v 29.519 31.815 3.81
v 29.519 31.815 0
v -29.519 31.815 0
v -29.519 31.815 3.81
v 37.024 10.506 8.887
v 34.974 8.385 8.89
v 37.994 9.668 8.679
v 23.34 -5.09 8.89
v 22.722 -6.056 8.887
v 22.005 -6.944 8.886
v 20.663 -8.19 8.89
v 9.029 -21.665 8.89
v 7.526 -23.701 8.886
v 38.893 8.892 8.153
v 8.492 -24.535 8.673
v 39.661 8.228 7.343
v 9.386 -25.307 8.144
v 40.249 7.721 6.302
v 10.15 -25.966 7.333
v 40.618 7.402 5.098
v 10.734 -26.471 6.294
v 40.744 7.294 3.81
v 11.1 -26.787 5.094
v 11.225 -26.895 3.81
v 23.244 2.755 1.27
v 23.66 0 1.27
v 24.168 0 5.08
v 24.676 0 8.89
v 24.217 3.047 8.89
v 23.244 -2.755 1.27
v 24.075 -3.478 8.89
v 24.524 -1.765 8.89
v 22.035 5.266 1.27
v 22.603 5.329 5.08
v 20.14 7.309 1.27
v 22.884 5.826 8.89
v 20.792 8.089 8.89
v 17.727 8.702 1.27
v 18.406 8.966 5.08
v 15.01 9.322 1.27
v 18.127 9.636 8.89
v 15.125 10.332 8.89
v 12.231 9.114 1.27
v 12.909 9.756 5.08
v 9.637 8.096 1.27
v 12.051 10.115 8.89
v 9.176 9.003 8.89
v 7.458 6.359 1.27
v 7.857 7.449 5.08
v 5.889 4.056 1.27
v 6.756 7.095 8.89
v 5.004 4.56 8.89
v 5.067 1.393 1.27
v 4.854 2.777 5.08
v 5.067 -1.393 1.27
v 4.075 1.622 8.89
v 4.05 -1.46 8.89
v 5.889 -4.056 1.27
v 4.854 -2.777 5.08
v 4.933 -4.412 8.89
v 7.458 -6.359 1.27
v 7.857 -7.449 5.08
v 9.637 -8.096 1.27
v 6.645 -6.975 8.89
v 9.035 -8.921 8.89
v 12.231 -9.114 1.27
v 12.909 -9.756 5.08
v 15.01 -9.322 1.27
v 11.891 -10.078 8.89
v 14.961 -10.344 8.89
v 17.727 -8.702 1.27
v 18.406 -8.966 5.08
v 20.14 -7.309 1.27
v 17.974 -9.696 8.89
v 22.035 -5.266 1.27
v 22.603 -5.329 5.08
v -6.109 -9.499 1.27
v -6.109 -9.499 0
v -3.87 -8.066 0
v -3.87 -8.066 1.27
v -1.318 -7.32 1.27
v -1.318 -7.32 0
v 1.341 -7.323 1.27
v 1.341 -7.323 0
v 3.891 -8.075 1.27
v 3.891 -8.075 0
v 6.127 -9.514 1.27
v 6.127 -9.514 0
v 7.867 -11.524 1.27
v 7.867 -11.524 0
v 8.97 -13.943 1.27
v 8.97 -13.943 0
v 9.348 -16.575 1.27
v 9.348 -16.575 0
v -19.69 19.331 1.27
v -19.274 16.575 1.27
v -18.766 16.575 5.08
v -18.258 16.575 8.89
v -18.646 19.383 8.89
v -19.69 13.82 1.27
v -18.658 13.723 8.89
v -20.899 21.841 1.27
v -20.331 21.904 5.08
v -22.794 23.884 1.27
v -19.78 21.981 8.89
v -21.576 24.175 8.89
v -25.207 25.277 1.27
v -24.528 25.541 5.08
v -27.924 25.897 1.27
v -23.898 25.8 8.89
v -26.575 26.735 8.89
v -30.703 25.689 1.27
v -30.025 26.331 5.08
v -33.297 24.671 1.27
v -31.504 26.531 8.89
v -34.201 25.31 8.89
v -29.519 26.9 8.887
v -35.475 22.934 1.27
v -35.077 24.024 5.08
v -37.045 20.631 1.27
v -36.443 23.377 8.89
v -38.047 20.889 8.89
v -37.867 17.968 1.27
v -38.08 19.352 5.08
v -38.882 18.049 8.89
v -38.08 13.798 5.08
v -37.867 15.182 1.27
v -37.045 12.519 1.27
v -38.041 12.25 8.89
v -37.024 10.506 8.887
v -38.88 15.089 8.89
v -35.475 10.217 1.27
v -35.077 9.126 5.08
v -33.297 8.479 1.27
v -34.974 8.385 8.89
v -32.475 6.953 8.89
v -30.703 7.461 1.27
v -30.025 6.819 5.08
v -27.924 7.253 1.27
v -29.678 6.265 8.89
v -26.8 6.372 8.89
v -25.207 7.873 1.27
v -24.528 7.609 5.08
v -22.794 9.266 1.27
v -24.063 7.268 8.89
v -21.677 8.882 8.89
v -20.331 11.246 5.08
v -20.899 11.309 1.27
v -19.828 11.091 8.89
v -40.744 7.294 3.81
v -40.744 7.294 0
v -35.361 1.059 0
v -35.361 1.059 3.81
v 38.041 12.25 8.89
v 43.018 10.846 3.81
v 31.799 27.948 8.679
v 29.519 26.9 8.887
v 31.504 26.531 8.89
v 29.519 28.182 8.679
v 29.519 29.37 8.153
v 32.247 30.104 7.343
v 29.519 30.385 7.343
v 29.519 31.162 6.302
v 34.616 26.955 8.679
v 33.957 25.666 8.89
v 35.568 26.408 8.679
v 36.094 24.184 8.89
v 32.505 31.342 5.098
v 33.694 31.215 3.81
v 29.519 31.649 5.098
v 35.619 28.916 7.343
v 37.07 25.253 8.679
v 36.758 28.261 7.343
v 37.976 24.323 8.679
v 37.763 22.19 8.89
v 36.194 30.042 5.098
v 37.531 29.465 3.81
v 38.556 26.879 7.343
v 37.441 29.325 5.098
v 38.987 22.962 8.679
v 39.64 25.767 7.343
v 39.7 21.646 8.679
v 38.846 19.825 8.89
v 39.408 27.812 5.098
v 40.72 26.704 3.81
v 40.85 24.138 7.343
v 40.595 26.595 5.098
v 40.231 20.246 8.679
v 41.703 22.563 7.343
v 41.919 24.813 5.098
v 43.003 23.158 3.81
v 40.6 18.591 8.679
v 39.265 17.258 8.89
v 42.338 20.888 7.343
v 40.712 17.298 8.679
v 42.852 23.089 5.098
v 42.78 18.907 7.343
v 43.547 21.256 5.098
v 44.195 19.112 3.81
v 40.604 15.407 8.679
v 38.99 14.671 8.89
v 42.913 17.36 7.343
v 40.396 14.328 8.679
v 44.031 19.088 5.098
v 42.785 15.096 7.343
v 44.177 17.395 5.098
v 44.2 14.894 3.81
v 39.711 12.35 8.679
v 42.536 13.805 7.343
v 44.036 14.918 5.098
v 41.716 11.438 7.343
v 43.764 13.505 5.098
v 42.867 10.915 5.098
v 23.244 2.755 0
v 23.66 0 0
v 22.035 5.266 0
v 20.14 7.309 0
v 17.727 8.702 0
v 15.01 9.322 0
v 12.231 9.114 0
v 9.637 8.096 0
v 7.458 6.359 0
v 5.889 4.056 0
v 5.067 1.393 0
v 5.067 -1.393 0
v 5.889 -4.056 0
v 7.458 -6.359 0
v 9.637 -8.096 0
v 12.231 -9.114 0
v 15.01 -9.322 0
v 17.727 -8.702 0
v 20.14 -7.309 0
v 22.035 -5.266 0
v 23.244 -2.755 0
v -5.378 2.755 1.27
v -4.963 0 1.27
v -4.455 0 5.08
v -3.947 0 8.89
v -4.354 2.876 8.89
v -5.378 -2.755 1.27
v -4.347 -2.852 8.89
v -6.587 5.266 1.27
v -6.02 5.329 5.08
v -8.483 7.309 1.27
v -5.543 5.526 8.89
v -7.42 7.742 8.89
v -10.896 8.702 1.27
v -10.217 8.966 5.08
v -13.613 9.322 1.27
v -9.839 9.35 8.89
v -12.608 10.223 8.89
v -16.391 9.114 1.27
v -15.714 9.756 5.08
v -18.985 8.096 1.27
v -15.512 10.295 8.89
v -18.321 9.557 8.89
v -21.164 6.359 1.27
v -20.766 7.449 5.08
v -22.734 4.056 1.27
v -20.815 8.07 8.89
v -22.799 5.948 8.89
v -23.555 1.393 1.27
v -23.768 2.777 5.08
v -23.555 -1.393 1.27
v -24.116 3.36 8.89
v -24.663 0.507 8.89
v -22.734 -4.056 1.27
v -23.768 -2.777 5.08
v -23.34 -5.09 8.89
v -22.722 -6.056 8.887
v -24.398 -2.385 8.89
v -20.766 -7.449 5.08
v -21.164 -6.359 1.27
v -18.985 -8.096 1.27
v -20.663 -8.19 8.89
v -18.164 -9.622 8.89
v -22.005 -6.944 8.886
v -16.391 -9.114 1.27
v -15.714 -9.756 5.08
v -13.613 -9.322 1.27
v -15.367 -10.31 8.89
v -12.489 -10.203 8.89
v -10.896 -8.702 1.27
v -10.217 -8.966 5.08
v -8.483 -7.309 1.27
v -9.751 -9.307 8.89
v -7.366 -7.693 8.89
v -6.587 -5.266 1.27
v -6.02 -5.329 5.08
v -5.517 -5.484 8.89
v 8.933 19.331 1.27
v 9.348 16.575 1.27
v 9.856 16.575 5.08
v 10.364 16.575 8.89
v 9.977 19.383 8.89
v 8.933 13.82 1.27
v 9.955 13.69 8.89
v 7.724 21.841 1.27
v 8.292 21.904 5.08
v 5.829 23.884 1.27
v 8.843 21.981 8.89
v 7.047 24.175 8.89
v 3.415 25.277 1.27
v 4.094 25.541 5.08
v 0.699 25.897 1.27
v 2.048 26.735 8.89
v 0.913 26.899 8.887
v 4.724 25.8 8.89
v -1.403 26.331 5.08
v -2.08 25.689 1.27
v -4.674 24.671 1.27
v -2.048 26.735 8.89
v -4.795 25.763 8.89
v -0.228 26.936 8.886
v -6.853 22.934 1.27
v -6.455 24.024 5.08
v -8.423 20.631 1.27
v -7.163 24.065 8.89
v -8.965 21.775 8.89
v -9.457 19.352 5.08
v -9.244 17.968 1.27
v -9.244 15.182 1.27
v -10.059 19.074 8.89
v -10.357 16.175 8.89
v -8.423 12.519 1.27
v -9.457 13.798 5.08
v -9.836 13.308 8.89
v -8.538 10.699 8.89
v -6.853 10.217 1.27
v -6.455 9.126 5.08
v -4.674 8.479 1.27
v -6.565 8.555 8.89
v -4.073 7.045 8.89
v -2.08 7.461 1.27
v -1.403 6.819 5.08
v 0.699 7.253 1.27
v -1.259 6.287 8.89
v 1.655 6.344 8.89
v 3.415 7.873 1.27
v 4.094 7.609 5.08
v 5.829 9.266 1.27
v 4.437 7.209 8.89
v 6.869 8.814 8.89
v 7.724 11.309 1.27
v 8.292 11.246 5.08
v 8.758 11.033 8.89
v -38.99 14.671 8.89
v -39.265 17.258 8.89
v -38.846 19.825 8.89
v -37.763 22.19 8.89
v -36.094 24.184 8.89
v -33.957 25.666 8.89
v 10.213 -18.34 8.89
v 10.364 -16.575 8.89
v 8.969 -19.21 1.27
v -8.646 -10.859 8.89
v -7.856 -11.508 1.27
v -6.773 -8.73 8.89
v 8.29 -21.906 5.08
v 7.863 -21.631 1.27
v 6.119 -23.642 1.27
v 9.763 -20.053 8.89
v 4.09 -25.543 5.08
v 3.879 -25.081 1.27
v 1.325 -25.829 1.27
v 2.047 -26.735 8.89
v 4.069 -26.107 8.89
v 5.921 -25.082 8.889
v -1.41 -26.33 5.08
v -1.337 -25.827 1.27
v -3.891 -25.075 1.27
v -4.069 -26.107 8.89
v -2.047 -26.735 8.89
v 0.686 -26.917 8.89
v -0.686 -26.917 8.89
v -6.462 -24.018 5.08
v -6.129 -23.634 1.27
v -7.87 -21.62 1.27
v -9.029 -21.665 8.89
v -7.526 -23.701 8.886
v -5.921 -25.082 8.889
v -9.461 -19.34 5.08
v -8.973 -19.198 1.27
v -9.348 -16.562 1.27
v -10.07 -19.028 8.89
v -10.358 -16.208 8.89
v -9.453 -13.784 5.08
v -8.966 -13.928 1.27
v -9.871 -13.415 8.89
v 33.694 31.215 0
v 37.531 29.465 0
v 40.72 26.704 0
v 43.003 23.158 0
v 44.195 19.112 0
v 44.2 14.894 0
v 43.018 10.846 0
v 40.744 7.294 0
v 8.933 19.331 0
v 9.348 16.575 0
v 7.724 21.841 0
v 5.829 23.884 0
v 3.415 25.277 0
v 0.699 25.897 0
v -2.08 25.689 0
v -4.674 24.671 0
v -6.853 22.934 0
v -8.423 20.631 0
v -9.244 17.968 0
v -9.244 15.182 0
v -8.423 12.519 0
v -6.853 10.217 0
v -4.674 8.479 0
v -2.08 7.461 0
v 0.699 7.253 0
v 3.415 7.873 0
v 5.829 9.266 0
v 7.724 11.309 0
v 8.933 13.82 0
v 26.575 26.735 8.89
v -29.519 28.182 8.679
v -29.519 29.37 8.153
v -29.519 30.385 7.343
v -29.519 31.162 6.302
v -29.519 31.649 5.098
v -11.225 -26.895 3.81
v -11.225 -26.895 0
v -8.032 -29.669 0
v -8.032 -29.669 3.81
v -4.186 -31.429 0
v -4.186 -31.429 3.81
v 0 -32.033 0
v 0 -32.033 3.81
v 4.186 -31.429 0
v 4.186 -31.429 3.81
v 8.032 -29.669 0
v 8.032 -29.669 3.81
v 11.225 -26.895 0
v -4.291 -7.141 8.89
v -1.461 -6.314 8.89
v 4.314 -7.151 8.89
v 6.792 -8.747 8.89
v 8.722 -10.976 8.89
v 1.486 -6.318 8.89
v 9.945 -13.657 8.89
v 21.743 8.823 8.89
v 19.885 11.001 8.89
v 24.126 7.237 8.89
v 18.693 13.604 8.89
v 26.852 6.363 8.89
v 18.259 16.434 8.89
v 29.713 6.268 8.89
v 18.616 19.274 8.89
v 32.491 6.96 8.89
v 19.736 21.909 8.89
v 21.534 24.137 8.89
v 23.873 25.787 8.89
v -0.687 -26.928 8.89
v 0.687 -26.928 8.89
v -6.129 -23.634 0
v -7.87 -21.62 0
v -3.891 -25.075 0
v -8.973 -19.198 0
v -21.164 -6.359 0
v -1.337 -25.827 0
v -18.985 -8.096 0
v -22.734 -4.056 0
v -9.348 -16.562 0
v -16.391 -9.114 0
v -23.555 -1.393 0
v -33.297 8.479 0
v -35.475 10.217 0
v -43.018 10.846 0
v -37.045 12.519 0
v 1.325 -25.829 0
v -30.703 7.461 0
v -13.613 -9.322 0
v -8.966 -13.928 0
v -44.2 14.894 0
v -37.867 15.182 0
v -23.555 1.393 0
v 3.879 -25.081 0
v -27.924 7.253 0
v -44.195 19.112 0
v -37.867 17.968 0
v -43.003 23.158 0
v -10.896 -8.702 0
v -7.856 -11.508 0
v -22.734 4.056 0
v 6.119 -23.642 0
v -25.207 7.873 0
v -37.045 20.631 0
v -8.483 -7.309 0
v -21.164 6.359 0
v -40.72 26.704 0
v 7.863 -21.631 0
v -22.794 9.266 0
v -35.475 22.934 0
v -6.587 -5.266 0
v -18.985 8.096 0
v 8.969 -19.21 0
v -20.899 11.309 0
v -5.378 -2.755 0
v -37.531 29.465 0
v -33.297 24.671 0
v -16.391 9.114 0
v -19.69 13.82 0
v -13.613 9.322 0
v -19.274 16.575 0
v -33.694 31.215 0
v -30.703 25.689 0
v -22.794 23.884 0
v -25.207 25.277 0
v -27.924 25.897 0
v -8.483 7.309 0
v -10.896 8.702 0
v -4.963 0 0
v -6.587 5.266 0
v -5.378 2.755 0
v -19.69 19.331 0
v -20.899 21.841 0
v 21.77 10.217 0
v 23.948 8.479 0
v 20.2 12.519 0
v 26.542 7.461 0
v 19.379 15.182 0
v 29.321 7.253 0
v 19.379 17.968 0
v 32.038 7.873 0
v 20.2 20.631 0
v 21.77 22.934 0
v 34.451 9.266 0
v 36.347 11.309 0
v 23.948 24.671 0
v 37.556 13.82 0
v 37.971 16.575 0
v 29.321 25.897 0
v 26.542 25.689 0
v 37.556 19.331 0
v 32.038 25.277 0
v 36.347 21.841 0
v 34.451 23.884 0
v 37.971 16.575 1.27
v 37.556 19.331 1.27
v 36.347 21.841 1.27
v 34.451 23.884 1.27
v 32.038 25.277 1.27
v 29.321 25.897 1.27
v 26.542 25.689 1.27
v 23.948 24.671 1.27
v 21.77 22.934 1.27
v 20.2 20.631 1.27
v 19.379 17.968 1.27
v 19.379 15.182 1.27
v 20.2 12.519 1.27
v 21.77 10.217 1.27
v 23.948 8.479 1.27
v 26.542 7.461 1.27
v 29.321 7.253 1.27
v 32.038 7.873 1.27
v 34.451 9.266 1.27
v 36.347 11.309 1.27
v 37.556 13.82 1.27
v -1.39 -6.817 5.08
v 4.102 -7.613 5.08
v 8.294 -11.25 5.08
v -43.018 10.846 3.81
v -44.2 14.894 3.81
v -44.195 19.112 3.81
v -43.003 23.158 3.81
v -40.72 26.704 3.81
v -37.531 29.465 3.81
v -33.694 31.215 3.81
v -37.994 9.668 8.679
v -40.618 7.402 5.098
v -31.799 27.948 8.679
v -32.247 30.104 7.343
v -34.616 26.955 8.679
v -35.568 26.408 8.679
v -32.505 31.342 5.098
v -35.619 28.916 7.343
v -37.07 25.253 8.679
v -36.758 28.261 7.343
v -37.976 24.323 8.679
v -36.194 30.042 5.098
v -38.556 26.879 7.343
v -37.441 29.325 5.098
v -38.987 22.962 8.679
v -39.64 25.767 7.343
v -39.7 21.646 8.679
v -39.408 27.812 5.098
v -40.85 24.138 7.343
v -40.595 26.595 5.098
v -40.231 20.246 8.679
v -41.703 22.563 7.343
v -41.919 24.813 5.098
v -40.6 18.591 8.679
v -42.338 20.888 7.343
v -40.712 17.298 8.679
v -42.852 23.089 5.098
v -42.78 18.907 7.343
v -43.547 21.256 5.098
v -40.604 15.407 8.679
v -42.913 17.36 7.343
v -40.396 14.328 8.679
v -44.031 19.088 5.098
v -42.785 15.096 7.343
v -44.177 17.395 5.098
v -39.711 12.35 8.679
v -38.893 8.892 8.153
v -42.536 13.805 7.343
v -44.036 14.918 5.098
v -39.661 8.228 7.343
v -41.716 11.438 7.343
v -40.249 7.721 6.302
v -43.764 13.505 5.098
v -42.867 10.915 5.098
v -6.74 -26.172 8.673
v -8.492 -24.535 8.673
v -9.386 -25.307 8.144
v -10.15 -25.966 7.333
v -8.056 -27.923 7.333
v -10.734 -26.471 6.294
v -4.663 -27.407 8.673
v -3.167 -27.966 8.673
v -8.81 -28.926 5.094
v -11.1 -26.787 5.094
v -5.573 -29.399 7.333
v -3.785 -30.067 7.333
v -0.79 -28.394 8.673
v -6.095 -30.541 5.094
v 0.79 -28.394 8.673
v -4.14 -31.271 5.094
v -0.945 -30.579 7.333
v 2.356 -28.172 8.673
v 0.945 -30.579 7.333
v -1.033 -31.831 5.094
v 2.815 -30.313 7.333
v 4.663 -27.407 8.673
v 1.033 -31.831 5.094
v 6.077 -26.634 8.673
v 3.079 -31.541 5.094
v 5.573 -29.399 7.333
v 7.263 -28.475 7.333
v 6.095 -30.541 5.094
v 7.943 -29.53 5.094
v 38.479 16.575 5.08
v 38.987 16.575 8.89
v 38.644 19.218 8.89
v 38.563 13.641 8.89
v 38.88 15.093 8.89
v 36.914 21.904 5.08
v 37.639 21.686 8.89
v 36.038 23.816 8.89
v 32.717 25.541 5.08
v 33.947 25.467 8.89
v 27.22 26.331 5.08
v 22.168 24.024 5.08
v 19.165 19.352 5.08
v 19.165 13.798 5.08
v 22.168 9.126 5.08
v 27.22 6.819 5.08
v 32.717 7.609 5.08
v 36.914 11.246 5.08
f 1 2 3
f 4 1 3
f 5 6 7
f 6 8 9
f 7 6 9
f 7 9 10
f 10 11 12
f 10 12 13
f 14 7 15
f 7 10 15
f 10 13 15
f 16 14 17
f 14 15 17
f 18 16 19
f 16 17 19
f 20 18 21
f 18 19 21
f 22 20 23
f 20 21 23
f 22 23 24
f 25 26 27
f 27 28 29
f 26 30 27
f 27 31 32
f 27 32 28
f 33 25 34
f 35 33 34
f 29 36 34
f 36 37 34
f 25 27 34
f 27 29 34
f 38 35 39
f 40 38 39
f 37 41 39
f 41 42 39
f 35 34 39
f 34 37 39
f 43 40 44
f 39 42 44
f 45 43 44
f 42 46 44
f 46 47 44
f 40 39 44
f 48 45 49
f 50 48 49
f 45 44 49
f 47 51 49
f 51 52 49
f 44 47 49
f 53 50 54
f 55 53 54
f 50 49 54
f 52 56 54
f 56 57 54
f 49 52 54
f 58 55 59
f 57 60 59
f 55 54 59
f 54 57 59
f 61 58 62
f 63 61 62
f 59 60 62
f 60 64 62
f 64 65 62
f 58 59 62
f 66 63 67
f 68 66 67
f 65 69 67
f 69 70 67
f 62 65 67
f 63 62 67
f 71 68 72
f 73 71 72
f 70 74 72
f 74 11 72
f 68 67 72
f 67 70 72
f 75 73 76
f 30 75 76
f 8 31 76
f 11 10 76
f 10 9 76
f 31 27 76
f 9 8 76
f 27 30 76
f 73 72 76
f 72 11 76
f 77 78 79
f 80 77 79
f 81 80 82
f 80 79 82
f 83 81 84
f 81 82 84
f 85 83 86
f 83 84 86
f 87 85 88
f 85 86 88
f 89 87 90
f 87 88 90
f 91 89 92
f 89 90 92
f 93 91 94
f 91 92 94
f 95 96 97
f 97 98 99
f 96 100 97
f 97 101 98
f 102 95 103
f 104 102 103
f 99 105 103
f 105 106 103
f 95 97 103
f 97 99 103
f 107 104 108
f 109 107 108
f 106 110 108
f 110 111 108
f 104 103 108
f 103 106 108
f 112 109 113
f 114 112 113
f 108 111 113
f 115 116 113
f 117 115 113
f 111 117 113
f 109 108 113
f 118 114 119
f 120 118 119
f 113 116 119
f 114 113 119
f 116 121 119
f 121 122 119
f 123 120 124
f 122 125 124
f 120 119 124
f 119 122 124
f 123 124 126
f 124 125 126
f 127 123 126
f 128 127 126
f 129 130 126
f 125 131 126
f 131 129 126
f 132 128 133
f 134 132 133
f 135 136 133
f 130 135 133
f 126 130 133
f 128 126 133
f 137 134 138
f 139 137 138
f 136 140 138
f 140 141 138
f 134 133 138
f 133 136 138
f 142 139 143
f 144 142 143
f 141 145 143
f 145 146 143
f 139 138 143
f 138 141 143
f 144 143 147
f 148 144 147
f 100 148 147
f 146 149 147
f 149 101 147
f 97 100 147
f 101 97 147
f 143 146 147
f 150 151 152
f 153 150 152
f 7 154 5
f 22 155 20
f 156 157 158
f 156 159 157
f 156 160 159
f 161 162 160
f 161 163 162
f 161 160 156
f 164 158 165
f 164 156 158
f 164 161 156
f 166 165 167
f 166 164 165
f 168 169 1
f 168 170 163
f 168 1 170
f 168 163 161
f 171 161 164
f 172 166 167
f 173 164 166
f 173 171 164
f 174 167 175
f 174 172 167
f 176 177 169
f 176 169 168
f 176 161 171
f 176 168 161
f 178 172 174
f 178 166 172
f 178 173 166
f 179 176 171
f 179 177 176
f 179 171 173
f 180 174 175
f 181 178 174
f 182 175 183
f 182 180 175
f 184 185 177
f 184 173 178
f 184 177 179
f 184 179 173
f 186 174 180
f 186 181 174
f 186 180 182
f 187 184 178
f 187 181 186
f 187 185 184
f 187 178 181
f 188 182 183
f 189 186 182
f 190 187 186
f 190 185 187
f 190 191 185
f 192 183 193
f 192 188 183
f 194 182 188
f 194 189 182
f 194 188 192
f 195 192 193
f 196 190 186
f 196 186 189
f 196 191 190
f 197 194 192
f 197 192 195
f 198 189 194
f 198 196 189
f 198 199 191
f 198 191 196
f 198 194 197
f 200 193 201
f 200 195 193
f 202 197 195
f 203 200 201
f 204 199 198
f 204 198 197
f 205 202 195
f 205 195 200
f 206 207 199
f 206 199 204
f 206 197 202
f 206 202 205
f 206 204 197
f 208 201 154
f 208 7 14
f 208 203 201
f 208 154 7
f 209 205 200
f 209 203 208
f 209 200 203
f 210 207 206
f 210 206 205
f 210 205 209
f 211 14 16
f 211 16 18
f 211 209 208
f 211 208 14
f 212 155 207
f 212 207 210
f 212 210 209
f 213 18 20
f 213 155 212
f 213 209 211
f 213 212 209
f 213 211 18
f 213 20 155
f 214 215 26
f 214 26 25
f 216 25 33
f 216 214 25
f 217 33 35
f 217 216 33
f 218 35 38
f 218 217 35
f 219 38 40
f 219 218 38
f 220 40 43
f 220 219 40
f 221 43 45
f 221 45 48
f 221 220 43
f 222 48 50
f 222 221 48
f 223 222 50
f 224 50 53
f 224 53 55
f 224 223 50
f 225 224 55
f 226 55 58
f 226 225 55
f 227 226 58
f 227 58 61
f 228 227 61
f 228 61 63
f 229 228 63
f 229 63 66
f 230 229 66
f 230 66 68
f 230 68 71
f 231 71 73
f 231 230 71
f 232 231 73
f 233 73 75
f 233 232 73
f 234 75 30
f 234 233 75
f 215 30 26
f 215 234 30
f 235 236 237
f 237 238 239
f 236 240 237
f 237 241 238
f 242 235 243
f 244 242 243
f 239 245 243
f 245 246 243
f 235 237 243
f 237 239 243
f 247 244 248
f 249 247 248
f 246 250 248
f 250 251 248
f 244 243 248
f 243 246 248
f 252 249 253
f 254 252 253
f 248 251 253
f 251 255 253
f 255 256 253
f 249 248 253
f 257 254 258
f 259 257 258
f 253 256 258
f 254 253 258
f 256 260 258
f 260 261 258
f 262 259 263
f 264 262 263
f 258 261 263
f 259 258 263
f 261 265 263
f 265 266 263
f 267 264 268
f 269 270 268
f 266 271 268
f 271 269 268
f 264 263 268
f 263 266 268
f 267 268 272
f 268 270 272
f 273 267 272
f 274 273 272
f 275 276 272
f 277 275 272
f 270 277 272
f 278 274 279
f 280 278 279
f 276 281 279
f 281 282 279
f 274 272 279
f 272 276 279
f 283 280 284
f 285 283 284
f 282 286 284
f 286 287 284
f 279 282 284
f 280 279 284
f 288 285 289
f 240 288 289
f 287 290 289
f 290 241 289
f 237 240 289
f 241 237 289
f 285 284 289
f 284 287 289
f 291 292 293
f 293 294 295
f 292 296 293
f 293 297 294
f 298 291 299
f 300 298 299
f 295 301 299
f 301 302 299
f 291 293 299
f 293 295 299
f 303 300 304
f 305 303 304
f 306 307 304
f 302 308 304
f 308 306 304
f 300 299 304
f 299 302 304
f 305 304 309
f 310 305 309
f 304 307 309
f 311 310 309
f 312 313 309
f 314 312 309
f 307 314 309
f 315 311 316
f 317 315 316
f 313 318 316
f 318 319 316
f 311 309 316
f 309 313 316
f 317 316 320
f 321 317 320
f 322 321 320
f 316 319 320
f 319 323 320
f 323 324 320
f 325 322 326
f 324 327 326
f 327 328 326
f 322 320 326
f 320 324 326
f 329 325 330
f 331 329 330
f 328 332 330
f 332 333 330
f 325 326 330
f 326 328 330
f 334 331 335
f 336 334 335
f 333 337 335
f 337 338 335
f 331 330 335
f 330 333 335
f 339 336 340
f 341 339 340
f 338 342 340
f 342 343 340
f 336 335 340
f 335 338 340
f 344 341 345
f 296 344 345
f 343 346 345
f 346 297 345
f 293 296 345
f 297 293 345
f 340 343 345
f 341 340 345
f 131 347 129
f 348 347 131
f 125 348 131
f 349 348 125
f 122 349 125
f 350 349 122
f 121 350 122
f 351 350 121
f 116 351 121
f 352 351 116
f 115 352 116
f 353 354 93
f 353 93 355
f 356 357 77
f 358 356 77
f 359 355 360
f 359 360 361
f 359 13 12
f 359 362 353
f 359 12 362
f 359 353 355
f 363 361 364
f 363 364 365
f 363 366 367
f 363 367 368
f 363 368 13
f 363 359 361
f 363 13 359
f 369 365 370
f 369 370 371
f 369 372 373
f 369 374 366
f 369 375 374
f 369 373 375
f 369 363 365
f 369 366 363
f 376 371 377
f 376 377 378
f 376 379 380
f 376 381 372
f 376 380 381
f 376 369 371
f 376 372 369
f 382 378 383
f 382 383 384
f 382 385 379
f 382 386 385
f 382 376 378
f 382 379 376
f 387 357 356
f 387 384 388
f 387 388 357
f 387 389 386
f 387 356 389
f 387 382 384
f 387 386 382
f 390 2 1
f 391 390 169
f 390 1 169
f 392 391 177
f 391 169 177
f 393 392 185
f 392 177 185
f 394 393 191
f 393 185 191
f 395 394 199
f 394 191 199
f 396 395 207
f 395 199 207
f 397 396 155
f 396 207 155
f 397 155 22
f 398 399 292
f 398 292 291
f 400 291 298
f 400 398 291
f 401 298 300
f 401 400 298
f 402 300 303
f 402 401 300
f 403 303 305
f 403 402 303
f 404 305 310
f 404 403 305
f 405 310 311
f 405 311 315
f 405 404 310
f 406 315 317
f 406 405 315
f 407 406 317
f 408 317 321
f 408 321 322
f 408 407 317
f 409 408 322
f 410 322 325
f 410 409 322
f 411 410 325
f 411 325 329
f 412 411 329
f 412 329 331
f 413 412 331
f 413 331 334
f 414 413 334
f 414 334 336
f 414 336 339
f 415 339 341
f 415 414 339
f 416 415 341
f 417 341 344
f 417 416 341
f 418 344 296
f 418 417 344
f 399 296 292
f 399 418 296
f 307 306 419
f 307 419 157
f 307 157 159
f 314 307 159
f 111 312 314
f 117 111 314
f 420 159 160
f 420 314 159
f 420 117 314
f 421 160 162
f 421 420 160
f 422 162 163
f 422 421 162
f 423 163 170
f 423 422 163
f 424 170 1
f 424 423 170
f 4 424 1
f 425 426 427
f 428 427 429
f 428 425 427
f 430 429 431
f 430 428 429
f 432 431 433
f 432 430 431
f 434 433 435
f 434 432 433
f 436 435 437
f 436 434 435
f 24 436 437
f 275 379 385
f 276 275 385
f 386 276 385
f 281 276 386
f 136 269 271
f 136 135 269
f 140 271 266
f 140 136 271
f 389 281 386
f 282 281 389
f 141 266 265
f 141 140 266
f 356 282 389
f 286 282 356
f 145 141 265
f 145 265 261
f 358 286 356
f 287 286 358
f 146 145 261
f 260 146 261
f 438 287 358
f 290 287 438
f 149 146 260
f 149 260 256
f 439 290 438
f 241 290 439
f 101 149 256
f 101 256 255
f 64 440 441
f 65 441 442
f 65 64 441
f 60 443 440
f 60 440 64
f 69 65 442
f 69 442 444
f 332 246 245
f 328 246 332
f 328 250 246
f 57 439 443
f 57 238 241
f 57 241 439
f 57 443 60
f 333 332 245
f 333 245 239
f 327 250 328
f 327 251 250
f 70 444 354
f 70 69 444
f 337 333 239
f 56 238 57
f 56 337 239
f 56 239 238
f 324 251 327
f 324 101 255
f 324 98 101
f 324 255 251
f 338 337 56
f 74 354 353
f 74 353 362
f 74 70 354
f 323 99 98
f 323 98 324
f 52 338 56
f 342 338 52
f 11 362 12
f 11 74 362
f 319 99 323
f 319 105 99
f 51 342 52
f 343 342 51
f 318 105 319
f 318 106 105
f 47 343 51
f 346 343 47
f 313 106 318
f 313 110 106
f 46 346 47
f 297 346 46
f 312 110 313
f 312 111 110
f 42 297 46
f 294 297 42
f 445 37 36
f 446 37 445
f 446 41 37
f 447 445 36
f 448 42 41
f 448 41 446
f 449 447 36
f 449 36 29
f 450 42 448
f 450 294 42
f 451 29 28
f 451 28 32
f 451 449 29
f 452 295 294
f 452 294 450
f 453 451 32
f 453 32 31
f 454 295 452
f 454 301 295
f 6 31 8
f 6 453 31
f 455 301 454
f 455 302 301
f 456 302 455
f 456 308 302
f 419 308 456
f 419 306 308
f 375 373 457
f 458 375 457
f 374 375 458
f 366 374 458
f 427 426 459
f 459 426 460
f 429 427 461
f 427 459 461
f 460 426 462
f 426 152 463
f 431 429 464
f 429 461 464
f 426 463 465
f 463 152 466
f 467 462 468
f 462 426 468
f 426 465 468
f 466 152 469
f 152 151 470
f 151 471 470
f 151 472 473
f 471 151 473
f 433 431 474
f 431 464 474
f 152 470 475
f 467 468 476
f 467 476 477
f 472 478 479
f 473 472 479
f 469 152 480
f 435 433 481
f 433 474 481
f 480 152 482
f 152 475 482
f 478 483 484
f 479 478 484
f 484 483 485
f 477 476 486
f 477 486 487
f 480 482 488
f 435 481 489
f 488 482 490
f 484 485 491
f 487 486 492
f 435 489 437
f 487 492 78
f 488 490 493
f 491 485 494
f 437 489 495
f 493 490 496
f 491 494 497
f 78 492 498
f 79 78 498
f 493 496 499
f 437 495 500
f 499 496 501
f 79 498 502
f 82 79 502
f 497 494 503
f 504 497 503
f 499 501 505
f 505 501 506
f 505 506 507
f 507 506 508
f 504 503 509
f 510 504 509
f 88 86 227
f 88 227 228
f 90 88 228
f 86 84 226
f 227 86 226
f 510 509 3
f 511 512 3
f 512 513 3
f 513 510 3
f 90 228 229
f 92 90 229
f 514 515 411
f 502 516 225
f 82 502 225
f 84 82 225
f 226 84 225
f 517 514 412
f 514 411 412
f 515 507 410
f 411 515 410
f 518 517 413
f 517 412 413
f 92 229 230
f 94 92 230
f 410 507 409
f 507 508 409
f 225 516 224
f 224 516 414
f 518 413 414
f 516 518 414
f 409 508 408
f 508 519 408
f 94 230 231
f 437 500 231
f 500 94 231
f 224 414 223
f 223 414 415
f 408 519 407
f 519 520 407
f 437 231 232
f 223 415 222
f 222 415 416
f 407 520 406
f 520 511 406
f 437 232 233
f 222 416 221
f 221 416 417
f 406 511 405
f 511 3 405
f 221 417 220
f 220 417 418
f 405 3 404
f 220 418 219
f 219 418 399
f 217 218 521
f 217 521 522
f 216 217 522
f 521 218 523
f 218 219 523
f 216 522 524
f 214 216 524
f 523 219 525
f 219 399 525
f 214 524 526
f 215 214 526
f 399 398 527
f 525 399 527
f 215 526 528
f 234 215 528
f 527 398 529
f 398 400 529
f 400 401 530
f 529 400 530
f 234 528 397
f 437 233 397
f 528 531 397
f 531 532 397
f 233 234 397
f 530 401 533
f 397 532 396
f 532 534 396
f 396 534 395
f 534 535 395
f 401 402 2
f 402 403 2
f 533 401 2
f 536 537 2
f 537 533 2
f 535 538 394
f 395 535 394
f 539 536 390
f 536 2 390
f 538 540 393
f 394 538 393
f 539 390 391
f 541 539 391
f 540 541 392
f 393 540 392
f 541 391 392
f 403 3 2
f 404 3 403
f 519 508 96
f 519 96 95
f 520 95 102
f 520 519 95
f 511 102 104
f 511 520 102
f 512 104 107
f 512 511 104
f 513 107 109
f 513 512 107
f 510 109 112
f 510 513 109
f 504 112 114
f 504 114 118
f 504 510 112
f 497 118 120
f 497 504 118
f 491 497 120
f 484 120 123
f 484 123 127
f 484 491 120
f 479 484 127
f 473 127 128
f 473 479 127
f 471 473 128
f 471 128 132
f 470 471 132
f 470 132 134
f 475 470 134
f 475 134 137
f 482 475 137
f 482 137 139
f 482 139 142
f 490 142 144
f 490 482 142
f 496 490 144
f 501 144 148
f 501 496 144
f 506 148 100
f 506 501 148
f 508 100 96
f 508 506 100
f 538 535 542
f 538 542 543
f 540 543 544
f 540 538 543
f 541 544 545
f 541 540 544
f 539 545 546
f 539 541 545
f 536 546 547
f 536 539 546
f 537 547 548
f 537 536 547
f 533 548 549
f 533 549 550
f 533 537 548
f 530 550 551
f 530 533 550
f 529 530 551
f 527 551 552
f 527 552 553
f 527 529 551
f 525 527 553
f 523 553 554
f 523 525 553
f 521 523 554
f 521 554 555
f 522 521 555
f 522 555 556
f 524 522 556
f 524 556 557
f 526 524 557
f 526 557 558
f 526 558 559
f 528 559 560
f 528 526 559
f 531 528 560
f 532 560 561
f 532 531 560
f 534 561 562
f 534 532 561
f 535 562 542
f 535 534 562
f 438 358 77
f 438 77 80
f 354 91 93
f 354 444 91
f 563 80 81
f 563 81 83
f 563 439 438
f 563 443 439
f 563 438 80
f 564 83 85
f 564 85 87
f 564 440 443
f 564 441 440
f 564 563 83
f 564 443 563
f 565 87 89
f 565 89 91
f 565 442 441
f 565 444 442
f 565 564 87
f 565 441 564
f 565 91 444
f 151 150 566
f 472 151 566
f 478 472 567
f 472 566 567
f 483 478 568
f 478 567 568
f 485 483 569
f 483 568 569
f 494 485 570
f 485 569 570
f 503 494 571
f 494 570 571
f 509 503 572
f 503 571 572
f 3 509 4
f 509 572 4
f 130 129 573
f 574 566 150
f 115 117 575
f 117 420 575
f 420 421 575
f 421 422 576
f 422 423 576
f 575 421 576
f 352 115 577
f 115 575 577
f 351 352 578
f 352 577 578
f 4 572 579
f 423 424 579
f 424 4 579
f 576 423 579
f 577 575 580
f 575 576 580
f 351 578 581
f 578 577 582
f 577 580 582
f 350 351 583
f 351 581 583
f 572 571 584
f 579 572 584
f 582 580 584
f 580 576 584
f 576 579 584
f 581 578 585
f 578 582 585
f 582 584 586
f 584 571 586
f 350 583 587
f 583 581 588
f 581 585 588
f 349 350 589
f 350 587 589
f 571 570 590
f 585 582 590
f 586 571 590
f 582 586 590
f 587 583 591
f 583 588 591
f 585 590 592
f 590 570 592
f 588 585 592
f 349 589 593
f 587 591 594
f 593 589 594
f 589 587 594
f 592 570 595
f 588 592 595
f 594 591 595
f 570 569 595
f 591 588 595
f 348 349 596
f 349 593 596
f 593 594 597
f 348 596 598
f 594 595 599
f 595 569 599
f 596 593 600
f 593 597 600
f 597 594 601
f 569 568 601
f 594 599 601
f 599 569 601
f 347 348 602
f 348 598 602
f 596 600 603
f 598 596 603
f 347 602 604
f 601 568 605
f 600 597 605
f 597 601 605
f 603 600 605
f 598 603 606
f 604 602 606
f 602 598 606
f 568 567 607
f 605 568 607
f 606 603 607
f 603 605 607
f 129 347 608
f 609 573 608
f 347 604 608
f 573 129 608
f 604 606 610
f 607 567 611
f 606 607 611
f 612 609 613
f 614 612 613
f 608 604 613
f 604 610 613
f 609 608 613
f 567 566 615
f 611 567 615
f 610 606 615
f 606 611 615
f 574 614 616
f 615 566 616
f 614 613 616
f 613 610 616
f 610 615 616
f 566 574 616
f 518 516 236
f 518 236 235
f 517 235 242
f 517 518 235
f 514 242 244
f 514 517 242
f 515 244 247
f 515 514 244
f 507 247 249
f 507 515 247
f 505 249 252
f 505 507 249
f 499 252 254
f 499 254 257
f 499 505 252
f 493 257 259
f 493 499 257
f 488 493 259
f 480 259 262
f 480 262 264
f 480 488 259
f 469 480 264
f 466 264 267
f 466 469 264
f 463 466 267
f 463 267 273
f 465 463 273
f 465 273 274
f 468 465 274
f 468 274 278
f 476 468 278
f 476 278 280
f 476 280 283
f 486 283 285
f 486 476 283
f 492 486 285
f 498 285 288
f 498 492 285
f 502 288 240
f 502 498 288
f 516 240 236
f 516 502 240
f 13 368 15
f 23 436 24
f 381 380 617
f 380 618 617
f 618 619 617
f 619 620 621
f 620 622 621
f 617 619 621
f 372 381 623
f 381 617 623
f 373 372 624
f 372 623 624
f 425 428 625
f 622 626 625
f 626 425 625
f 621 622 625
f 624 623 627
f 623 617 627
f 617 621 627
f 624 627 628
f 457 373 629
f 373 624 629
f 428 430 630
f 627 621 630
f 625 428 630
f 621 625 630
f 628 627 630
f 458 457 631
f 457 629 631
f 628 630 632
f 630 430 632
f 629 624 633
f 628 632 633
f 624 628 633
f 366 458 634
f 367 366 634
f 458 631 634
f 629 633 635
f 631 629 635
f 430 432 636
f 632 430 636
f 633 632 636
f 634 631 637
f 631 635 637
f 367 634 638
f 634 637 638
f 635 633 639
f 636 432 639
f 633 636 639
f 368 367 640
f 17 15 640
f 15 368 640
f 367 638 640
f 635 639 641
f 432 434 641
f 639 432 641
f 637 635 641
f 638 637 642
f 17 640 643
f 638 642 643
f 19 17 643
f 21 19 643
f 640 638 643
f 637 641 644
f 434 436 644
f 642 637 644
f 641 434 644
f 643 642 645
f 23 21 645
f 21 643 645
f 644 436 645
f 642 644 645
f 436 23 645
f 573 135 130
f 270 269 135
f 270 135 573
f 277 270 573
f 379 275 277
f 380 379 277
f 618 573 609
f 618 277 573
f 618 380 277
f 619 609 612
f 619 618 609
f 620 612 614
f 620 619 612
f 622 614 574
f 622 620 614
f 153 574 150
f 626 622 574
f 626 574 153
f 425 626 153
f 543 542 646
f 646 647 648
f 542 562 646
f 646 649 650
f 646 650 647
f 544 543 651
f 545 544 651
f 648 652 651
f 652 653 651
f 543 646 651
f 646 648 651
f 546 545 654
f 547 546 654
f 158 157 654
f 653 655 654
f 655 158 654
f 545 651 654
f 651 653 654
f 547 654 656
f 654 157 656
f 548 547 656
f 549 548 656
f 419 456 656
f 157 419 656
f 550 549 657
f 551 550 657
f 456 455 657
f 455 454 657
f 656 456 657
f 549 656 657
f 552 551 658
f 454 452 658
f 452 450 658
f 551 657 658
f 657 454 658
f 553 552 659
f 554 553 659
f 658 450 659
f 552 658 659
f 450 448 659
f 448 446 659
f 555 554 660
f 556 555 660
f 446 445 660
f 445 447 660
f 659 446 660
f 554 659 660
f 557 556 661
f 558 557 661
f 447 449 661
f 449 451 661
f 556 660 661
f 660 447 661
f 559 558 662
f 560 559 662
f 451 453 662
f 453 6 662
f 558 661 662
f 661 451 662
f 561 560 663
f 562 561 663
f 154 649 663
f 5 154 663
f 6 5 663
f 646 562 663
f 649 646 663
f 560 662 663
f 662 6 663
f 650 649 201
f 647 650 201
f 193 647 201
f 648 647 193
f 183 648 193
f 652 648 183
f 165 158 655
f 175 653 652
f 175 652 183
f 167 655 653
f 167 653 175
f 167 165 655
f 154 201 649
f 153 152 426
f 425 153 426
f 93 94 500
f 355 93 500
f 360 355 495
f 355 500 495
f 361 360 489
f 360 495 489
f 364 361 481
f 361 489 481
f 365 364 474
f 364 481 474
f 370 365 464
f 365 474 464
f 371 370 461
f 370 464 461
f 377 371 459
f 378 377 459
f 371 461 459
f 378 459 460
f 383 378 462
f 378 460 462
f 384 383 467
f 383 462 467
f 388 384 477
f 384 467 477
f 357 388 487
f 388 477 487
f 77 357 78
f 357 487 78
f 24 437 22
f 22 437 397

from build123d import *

# Parameters (mm, degrees)
F0_R         = 9.3483634699
F1_DEPTH     = 8.89
F2_R         = 14.8297125388
F3_SIZE2     = 1.016
F3_SIZE      = 7.62
F3_2_SIZE2   = 1.016
F3_2_SIZE    = 7.62
F3_3_SIZE2   = 1.016
F3_3_SIZE    = 7.62
F3_4_SIZE2   = 1.016
F3_4_SIZE    = 7.62
F3_5_SIZE2   = 1.016
F3_5_SIZE    = 7.62
F3_6_SIZE2   = 1.016
F3_6_SIZE    = 7.62
F4_T1_DEPTH  = 45.1686724369
F4_T3_DEPTH  = 45.1686724369
F4_T5_DEPTH  = 59.0377910967
F4_T8_ANGLE  = 130.8079672241
F4_T10_ANGLE = 98.3840655518
F4_T12_ANGLE = 130.8079672241


# Not quite as in the source:
# - a fillet or chamfer that OpenCascade refuses, or shapes differently, is made with other operations: its cross-section is extruded or revolved along the edge and cut away or added
# - a feature names something its author has since deleted; it is built from what else it names


with BuildPart() as f1:
    # F0 (on Top) → F1 (new body)
    with BuildSketch(Plane.XY):
        Polygon((-61.9157478895, 31.8151319193), (-35.3605267654, 1.0592594085), (0, -39.8947905701), (61.9157478895, 31.8151319193), (0, 31.8151319193), align=None)
        with BuildLine():
            ThreePointArc((-6.1093972864, -9.4993164637), (3.8909531705, -8.0749917446), (9.3483634699, -16.5751319193))
            ThreePointArc((9.3483634699, -16.5751319193), (-3.8909531705, -25.075272094), (-6.1093972864, -9.4993164637))
        make_face(mode=Mode.SUBTRACT)
        with Locations((-14.3112926848, 0)):
            Circle(F0_R, mode=Mode.SUBTRACT)
        with Locations((-28.6225853696, 16.5751319193)):
            Circle(F0_R, mode=Mode.SUBTRACT)
        with Locations((14.3112926848, 0)):
            Circle(F0_R, mode=Mode.SUBTRACT)
        with Locations((0, 16.5751319193)):
            Circle(F0_R, mode=Mode.SUBTRACT)
        with Locations((28.6225853696, 16.5751319193)):
            Circle(F0_R, mode=Mode.SUBTRACT)
    extrude(amount=F1_DEPTH)

    # F2
    f2_edges = [f1.edges().sort_by_distance(p)[0] for p in [
        (0, -39.894791, 4.445),
        (-61.915748, 31.815132, 4.445),
        (61.915748, 31.815132, 4.445),
    ]]
    fillet(f2_edges, radius=F2_R)

    # F3
    f3_edges = [f1.edges().sort_by_distance(p)[0] for p in [
        (-37.970949, 16.575132, 8.89),
    ]]
    f3_side = f1.faces().sort_by_distance((-37.970949, 16.575132, 4.445))[0]
    chamfer(f3_edges, length=F3_SIZE, length2=F3_SIZE2, reference=f3_side)

    # F3#2
    f3_2_edges = [f1.edges().sort_by_distance(p)[0] for p in [
        (-23.659656, 0, 8.89),
    ]]
    f3_2_side = f1.faces().sort_by_distance((-23.659656, 0, 4.445))[0]
    chamfer(f3_2_edges, length=F3_2_SIZE, length2=F3_2_SIZE2, reference=f3_2_side)

    # F3#3
    f3_3_edges = [f1.edges().sort_by_distance(p)[0] for p in [
        (-9.348363, 16.575132, 8.89),
    ]]
    f3_3_side = f1.faces().sort_by_distance((-9.348363, 16.575132, 4.445))[0]
    chamfer(f3_3_edges, length=F3_3_SIZE, length2=F3_3_SIZE2, reference=f3_3_side)

    # F3#4
    f3_4_edges = [f1.edges().sort_by_distance(p)[0] for p in [
        (4.962929, 0, 8.89),
    ]]
    f3_4_side = f1.faces().sort_by_distance((4.962929, 0, 4.445))[0]
    chamfer(f3_4_edges, length=F3_4_SIZE, length2=F3_4_SIZE2, reference=f3_4_side)

    # F3#5
    f3_5_edges = [f1.edges().sort_by_distance(p)[0] for p in [
        (19.274222, 16.575132, 8.89),
    ]]
    f3_5_side = f1.faces().sort_by_distance((19.274222, 16.575132, 4.445))[0]
    chamfer(f3_5_edges, length=F3_5_SIZE, length2=F3_5_SIZE2, reference=f3_5_side)

    # F3#6
    f3_6_edges = [f1.edges().sort_by_distance(p)[0] for p in [
        (6.109397, -23.650947, 8.89),
    ]]
    f3_6_side = f1.faces().sort_by_distance((6.109397, -23.650947, 4.445))[0]
    chamfer(f3_6_edges, length=F3_6_SIZE, length2=F3_6_SIZE2, reference=f3_6_side)

    # F4: fillet of radius 5.08 on 6 edges, made by hand

    # F4_s2 → F4_t1 (cut)
    with BuildSketch(Plane(origin=(8.5095443903, -9.8556310704, 0), x_dir=(0, 0, 1), z_dir=(-0.6535258611, 0.7569041874, 0))):
        with BuildLine():
            ThreePointArc((8.89, -20.9922773601), (7.4021024484, -24.5843798086), (3.81, -26.0722773601))
            Line((3.81, -26.0722773601), (8.89, -26.0722773601))
            Line((8.89, -26.0722773601), (8.89, -20.9922773601))
        make_face()
    extrude(amount=F4_T1_DEPTH, mode=Mode.SUBTRACT)

    # F4_s4 → F4_t3 (cut)
    with BuildSketch(Plane(origin=(-8.5095443903, -9.8556310704, 0), x_dir=(0, 0, 1), z_dir=(0.6535258611, 0.7569041874, 0))):
        with BuildLine():
            ThreePointArc((8.89, 20.9922773601), (7.4021024484, 24.5843798086), (3.81, 26.0722773601))
            Line((3.81, 26.0722773601), (8.89, 26.0722773601))
            Line((8.89, 26.0722773601), (8.89, 20.9922773601))
        make_face()
    extrude(amount=F4_T3_DEPTH, mode=Mode.SUBTRACT)

    # F4_s6 → F4_t5 (cut)
    with BuildSketch(Plane.YZ.offset(-29.5188955483)):
        with BuildLine():
            ThreePointArc((26.7351319193, 8.89), (30.3272343677, 7.4021024484), (31.8151319193, 3.81))
            Line((31.8151319193, 3.81), (31.8151319193, 8.89))
            Line((31.8151319193, 8.89), (26.7351319193, 8.89))
        make_face()
    extrude(amount=F4_T5_DEPTH, mode=Mode.SUBTRACT)

    # F4_s7 → F4_t8 (revolve, cut)
    with BuildSketch(Plane.YZ.offset(-29.5188955483)):
        with BuildLine():
            ThreePointArc((26.7351319193, 8.89), (30.3272343677, 7.4021024484), (31.8151319193, 3.81))
            Line((31.8151319193, 3.81), (31.8151319193, 8.89))
            Line((31.8151319193, 8.89), (26.7351319193, 8.89))
        make_face()
    revolve(axis=Axis((-29.5188955483, 16.9854193804, 8.89), (0, 0, 1)), revolution_arc=F4_T8_ANGLE, mode=Mode.SUBTRACT)

    # F4_s9 → F4_t10 (revolve, cut)
    with BuildSketch(Plane(origin=(8.5095443903, -9.8556310704, 0), x_dir=(0, 0, 1), z_dir=(-0.6535258611, 0.7569041874, 0))):
        with BuildLine():
            ThreePointArc((8.89, -20.9922773601), (7.4021024484, -24.5843798086), (3.81, -26.0722773601))
            Line((3.81, -26.0722773601), (8.89, -26.0722773601))
            Line((8.89, -26.0722773601), (8.89, -20.9922773601))
        make_face()
    revolve(axis=Axis((0, -17.202937926, 8.89), (0, 0, 1)), revolution_arc=F4_T10_ANGLE, mode=Mode.SUBTRACT)

    # F4_s11 → F4_t12 (revolve, cut)
    with BuildSketch(Plane.YZ.offset(29.5188955483)):
        with BuildLine():
            ThreePointArc((26.7351319193, 8.89), (30.3272343677, 7.4021024484), (31.8151319193, 3.81))
            Line((31.8151319193, 3.81), (31.8151319193, 8.89))
            Line((31.8151319193, 8.89), (26.7351319193, 8.89))
        make_face()
    revolve(axis=Axis((29.5188955483, 16.9854193804, 8.89), (0, 0, -1)), revolution_arc=F4_T12_ANGLE, mode=Mode.SUBTRACT)


solid = f1.part
